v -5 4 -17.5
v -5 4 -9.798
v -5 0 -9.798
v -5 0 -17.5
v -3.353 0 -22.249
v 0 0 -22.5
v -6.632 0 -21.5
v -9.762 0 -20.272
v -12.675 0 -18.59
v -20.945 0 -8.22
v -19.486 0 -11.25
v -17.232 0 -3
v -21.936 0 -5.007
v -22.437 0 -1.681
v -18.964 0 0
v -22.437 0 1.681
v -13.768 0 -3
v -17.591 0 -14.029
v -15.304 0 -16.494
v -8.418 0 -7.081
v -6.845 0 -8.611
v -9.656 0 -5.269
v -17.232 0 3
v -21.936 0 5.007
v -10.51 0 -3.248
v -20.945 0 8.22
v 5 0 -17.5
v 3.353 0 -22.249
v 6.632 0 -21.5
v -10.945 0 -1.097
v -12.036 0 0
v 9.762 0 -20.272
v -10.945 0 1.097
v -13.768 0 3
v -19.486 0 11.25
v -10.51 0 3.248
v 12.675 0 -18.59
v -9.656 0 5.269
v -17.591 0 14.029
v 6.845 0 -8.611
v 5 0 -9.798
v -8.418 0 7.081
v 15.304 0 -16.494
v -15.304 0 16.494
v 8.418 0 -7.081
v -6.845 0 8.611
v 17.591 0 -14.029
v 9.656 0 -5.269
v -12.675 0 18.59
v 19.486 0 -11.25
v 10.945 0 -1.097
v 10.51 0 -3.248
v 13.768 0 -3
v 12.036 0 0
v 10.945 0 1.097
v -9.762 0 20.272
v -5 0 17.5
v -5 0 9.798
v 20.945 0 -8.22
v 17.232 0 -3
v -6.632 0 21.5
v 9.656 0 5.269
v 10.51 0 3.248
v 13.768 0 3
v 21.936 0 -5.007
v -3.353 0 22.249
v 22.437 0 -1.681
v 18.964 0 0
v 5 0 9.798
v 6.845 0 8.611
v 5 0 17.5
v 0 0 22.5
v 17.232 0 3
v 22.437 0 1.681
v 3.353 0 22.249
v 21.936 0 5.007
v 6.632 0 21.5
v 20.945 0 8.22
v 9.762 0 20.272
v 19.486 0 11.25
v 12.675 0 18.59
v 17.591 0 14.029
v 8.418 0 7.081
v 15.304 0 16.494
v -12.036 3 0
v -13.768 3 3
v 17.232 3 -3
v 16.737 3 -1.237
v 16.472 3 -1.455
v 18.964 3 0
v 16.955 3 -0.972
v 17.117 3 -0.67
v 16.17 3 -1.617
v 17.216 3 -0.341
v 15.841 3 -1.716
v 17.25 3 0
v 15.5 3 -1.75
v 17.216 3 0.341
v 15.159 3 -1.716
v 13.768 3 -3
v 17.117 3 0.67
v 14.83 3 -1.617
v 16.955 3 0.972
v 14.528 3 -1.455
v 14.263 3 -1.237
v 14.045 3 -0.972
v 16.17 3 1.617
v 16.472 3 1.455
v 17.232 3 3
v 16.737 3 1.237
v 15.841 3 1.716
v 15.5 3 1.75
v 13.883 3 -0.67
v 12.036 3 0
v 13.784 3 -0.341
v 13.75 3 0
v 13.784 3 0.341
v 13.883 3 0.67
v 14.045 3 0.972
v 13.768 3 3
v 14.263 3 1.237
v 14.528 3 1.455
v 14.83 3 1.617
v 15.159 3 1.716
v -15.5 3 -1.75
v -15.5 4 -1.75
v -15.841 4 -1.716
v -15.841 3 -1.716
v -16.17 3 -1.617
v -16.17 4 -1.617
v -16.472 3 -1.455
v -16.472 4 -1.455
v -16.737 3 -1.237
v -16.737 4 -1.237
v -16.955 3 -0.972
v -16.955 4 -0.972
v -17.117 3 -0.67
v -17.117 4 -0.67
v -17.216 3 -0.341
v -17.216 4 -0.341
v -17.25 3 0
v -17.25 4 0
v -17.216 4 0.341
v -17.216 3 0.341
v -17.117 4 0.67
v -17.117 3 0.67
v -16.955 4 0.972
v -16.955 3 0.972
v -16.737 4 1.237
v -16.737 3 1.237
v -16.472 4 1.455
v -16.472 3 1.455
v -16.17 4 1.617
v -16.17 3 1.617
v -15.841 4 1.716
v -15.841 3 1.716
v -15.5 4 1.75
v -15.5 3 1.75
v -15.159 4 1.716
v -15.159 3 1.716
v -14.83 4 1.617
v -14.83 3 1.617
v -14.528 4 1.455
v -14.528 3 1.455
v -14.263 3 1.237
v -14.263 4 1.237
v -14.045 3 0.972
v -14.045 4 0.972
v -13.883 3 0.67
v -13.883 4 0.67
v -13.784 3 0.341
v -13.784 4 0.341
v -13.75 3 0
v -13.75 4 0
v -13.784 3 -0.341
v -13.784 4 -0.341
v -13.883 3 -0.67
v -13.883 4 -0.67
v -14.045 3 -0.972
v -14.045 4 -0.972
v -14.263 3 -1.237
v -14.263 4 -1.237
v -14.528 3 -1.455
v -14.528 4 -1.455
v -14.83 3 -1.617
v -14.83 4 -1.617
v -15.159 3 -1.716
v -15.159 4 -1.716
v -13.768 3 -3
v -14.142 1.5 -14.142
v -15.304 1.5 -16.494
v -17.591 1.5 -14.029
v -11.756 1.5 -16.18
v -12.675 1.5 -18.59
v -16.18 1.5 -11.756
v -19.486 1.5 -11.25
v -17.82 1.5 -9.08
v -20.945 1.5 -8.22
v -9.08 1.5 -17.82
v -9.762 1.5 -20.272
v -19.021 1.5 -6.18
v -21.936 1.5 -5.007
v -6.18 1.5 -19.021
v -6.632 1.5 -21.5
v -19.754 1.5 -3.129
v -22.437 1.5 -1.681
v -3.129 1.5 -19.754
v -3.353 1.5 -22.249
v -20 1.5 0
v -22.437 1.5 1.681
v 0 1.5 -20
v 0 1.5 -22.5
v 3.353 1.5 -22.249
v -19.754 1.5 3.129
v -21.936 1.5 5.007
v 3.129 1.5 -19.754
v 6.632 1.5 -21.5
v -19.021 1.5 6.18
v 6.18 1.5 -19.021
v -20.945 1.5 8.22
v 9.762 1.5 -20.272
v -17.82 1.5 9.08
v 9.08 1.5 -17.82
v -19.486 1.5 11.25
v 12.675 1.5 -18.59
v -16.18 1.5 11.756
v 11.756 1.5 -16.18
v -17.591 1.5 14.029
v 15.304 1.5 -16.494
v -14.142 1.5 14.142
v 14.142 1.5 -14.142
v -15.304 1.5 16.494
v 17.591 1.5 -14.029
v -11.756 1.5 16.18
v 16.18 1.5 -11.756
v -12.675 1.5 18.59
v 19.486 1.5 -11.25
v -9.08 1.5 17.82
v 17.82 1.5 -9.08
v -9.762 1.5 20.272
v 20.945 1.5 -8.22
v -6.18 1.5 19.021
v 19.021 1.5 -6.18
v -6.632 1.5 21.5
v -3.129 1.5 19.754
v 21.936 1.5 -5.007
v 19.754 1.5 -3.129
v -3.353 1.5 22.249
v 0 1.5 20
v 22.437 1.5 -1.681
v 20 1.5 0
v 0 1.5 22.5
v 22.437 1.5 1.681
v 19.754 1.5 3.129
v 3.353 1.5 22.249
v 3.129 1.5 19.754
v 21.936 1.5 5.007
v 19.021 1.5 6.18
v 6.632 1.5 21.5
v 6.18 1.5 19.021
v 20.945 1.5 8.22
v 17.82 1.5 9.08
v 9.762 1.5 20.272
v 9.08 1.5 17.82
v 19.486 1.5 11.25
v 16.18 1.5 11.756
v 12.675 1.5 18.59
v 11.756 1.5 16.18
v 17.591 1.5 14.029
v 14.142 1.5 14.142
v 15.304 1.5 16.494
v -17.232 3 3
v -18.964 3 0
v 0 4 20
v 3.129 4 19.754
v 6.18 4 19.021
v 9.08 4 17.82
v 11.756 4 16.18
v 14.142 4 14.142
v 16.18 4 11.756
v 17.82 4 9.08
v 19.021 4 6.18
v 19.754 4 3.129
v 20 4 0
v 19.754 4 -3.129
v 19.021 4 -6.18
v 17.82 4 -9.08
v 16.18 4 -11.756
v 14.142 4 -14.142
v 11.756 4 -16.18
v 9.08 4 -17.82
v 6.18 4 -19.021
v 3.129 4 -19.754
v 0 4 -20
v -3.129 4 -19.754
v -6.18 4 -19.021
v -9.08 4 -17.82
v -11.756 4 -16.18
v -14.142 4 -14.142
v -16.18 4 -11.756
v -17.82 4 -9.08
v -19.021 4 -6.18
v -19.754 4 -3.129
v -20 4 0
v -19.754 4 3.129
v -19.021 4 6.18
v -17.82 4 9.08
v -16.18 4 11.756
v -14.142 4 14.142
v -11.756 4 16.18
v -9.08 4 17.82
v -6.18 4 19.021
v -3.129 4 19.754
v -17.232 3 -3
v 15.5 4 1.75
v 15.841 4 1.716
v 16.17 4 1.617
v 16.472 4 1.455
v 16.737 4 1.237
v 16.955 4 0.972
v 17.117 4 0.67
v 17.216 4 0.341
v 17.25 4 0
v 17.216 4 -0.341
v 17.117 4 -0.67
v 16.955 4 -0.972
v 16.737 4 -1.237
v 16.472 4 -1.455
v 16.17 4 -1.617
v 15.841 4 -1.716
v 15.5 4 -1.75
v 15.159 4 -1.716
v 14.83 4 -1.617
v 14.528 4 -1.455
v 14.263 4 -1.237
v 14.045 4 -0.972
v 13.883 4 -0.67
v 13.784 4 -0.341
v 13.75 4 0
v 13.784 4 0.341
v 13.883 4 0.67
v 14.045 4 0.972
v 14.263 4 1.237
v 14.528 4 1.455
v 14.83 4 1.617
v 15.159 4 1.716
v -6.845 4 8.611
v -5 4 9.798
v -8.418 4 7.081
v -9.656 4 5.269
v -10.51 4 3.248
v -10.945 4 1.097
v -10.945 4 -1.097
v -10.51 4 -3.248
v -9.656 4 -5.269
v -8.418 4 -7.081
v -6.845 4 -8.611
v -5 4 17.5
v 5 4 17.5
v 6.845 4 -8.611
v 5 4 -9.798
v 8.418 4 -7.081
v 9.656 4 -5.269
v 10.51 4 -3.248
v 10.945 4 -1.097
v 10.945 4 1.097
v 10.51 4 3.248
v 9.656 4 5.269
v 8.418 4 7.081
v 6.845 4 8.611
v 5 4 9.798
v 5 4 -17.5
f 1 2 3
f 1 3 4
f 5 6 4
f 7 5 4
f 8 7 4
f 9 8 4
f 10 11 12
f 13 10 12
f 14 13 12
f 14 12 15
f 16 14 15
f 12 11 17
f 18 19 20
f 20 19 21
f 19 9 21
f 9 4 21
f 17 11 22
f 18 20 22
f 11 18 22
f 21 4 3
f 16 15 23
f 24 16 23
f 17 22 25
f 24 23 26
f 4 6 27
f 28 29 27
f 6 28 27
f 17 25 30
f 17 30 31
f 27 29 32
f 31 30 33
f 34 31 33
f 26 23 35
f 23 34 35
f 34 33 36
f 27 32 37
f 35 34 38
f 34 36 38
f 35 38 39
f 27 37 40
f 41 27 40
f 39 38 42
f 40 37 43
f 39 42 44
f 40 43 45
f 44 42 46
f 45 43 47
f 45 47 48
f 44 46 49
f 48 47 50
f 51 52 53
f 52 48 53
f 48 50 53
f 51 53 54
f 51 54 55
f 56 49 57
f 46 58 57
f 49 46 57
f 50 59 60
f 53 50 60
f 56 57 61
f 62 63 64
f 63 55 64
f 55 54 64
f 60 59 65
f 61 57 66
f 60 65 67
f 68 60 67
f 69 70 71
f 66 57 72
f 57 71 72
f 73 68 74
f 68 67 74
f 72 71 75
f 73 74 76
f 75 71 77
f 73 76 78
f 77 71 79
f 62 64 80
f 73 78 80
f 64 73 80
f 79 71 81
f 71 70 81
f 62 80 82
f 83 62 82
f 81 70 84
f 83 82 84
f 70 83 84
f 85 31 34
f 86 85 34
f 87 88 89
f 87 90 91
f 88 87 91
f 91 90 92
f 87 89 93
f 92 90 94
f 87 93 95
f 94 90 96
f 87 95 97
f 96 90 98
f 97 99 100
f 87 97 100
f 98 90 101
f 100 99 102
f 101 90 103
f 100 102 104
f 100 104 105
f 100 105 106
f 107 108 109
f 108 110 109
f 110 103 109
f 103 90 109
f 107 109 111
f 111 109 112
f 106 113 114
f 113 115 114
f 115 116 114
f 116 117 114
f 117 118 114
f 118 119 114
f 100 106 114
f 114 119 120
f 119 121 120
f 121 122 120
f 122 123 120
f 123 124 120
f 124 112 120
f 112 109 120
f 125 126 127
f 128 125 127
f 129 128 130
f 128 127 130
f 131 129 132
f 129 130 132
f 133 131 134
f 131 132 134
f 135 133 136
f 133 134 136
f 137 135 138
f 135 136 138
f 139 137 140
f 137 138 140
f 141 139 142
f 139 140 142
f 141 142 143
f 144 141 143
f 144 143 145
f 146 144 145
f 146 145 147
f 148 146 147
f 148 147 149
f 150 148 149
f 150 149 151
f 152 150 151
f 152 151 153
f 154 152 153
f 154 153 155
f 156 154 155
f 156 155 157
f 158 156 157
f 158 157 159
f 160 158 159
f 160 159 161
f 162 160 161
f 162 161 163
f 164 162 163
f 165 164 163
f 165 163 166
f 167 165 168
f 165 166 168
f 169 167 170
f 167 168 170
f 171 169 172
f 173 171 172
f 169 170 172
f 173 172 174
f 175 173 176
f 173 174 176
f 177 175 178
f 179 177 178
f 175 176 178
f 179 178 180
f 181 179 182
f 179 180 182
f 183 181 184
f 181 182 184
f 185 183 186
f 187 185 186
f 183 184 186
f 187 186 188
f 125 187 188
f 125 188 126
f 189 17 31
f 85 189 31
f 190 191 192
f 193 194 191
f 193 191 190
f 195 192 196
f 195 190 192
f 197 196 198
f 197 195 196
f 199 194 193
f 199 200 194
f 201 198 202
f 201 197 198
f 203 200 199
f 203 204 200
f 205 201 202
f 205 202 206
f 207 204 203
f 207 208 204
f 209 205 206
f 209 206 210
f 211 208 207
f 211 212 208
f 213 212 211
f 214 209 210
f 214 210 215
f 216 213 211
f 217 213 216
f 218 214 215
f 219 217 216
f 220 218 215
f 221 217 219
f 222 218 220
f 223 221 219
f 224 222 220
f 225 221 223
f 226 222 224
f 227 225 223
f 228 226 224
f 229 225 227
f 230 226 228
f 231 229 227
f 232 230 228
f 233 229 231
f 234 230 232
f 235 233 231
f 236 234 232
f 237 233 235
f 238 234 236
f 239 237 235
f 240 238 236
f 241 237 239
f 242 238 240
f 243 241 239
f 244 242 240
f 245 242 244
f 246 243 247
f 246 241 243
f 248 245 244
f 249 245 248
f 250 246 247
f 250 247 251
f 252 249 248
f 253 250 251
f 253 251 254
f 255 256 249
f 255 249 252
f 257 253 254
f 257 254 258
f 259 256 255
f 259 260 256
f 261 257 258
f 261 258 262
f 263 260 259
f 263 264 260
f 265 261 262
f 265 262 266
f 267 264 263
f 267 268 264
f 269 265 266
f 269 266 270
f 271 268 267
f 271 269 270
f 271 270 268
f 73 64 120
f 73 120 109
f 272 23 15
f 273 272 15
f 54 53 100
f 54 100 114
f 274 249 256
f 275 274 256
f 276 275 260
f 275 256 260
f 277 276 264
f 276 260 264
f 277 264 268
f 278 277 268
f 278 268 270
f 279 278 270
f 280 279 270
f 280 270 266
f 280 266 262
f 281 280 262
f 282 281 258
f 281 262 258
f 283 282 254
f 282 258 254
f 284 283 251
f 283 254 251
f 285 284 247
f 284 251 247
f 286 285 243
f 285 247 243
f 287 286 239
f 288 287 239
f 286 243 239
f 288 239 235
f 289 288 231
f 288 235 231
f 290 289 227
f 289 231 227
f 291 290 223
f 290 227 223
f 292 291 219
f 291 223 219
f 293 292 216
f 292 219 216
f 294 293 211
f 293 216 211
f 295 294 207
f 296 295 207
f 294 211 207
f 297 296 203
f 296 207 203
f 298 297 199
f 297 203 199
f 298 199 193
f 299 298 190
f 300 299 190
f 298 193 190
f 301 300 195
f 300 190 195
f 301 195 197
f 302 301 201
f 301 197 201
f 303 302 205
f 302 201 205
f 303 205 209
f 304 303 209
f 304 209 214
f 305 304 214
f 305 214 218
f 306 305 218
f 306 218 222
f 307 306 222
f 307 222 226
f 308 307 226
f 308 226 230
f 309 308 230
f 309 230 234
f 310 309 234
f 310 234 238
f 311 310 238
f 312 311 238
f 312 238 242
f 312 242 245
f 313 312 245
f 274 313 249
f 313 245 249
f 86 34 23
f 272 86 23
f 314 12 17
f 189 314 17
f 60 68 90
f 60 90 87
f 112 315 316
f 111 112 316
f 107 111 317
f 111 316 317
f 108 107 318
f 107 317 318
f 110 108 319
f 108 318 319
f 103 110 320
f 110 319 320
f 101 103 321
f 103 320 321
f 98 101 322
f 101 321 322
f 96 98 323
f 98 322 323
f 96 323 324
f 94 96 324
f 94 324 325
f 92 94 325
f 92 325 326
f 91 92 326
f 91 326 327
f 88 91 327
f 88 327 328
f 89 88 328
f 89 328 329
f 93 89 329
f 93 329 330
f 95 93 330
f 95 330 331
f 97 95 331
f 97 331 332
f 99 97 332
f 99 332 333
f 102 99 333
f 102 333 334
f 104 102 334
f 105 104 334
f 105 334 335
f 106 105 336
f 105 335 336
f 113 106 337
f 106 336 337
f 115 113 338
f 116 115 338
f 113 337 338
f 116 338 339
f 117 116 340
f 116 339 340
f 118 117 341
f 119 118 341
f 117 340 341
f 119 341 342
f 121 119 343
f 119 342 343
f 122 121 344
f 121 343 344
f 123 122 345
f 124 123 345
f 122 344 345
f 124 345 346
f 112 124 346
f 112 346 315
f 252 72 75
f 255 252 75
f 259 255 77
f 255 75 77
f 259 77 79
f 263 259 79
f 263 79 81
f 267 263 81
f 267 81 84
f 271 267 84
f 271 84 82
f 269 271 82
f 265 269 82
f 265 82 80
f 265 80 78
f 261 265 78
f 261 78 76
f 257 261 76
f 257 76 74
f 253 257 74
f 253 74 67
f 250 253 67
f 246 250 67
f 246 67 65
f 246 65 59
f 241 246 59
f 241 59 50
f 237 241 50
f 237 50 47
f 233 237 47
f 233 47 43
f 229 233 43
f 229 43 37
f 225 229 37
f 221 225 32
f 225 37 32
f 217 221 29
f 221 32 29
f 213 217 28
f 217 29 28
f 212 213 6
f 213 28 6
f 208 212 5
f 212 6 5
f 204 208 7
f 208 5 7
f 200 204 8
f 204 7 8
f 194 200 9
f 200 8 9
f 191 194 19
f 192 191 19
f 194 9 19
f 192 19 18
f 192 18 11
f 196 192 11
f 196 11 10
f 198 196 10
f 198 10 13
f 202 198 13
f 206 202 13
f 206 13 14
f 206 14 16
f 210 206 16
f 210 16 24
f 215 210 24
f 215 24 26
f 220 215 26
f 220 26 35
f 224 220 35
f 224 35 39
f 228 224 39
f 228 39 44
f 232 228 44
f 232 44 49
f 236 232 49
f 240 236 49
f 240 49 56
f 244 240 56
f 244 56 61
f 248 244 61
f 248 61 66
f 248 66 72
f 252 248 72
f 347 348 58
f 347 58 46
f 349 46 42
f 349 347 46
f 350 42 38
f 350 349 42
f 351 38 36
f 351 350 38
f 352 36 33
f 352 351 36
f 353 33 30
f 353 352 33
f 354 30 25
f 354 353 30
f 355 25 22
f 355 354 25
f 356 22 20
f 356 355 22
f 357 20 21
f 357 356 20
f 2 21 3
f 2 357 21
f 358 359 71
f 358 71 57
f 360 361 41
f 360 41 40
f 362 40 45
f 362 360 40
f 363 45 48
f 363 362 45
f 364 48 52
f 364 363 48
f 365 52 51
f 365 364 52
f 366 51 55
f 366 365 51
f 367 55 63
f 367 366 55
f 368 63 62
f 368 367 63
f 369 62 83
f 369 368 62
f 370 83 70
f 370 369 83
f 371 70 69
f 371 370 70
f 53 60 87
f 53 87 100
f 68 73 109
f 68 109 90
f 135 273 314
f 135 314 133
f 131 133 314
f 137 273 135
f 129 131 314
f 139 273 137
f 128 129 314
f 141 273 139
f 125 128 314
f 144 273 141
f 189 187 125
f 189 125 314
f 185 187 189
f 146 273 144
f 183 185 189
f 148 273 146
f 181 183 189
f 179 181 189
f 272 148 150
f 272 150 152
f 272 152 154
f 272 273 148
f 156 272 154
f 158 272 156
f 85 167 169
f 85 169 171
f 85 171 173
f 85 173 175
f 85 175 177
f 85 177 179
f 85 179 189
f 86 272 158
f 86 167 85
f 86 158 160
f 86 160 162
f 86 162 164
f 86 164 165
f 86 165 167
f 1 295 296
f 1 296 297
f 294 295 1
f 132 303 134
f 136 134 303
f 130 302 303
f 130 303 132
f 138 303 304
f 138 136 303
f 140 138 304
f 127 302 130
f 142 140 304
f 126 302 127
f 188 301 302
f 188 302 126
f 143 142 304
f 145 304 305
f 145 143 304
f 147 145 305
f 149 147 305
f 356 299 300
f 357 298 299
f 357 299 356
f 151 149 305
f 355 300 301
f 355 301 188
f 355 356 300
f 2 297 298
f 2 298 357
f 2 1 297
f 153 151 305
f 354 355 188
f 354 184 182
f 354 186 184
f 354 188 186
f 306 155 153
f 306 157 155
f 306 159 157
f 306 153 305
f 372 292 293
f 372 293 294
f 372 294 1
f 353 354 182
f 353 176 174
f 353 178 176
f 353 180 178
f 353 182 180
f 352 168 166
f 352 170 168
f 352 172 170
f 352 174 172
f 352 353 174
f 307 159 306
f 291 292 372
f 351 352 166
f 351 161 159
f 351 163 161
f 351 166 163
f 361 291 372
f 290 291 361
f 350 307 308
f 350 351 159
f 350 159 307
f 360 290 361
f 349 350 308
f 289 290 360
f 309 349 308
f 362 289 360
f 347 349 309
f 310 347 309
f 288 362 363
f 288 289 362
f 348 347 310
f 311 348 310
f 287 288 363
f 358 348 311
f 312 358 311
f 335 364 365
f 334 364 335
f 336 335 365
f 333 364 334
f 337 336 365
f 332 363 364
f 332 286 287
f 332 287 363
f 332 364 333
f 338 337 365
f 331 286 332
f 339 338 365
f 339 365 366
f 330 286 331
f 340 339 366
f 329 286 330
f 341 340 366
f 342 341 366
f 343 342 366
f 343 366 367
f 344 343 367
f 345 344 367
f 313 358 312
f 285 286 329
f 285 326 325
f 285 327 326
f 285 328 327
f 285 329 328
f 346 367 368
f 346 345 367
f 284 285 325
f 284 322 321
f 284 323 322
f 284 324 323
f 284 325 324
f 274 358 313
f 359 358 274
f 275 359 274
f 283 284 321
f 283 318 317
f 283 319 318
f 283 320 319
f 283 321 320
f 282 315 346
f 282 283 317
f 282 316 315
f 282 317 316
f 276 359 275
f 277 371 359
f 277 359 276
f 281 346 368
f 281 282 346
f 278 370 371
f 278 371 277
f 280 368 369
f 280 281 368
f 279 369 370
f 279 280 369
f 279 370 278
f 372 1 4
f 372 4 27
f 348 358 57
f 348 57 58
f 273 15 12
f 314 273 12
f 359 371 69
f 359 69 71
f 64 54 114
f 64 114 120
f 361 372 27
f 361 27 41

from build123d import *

# Parameters (mm, degrees)
SKETCH1_R           = 22.5
BOSS_EXTRUDE2_DEPTH = 4
CUT_EXTRUDE1_START  = -2.5
SKETCH2_R           = 22.5
SKETCH2_R_2         = 20
CUT_EXTRUDE1_DEPTH  = 2.5
CUT_EXTRUDE2_DEPTH  = 33.070235422
SKETCH4_R           = 1.75
CUT_EXTRUDE3_DEPTH  = 33.070235422
CUT_EXTRUDE4_DEPTH  = 3


with BuildPart() as part:
    # Sketch1 → Boss-Extrude2 (new body)
    with BuildSketch(Plane(origin=(0, 0, 0), x_dir=(1, 0, 0), z_dir=(0, 1, 0))):
        with Locations(Location((0, 0, 0), (0, 0, 270))):
            Circle(SKETCH1_R)
    extrude(amount=BOSS_EXTRUDE2_DEPTH)

    # Sketch2 → Cut-Extrude1 (cut)
    with BuildSketch(Plane(origin=(0, 4, 0), x_dir=(1, 0, 0), z_dir=(0, 1, 0)).offset(CUT_EXTRUDE1_START)):
        with Locations(Location((0, 0, 0), (0, 0, 270))):
            Circle(SKETCH2_R)
        with Locations(Location((0, 0, 0), (0, 0, 270))):
            Circle(SKETCH2_R_2, mode=Mode.SUBTRACT)
    extrude(amount=CUT_EXTRUDE1_DEPTH, mode=Mode.SUBTRACT)

    # Sketch3 → Cut-Extrude2 (cut, through all)
    with BuildSketch(Plane(origin=(0, 4, 0), x_dir=(1, 0, 0), z_dir=(0, 1, 0))):
        with BuildLine():
            Line((5, -9.797958971), (5, -17.5))
            Line((5, -17.5), (-5, -17.5))
            Line((-5, -17.5), (-5, -9.797958971))
            ThreePointArc((-5, -9.797958971), (-11, 0), (-5, 9.797958971))
            Line((-5, 9.797958971), (-5, 17.5))
            Line((-5, 17.5), (5, 17.5))
            Line((5, 17.5), (5, 9.797958971))
            ThreePointArc((5, 9.797958971), (11, 0), (5, -9.797958971))
        make_face()
    extrude(amount=-CUT_EXTRUDE2_DEPTH, mode=Mode.SUBTRACT)

    # Sketch4 → Cut-Extrude3 (cut, through all)
    with BuildSketch(Plane(origin=(0, 4, 0), x_dir=(1, 0, 0), z_dir=(0, 1, 0))):
        with Locations(Location((15.5, 0, 0), (0, 0, 270))):
            Circle(SKETCH4_R)
        with Locations(Location((-15.5, 0, 0), (0, 0, 90))):
            Circle(SKETCH4_R)
    extrude(amount=-CUT_EXTRUDE3_DEPTH, mode=Mode.SUBTRACT)

    # Sketch5 → Cut-Extrude4 (cut)
    with BuildSketch(Plane.XZ):
        Polygon((13.767949192, -3), (12.035898385, 0), (13.767949192, 3), (17.232050808, 3), (18.964101615, 0), (17.232050808, -3), align=None)
        Polygon((-12.035898385, 0), (-13.767949192, 3), (-17.232050808, 3), (-18.964101615, 0), (-17.232050808, -3), (-13.767949192, -3), align=None)
    extrude(amount=-CUT_EXTRUDE4_DEPTH, mode=Mode.SUBTRACT)


solid = part.part
